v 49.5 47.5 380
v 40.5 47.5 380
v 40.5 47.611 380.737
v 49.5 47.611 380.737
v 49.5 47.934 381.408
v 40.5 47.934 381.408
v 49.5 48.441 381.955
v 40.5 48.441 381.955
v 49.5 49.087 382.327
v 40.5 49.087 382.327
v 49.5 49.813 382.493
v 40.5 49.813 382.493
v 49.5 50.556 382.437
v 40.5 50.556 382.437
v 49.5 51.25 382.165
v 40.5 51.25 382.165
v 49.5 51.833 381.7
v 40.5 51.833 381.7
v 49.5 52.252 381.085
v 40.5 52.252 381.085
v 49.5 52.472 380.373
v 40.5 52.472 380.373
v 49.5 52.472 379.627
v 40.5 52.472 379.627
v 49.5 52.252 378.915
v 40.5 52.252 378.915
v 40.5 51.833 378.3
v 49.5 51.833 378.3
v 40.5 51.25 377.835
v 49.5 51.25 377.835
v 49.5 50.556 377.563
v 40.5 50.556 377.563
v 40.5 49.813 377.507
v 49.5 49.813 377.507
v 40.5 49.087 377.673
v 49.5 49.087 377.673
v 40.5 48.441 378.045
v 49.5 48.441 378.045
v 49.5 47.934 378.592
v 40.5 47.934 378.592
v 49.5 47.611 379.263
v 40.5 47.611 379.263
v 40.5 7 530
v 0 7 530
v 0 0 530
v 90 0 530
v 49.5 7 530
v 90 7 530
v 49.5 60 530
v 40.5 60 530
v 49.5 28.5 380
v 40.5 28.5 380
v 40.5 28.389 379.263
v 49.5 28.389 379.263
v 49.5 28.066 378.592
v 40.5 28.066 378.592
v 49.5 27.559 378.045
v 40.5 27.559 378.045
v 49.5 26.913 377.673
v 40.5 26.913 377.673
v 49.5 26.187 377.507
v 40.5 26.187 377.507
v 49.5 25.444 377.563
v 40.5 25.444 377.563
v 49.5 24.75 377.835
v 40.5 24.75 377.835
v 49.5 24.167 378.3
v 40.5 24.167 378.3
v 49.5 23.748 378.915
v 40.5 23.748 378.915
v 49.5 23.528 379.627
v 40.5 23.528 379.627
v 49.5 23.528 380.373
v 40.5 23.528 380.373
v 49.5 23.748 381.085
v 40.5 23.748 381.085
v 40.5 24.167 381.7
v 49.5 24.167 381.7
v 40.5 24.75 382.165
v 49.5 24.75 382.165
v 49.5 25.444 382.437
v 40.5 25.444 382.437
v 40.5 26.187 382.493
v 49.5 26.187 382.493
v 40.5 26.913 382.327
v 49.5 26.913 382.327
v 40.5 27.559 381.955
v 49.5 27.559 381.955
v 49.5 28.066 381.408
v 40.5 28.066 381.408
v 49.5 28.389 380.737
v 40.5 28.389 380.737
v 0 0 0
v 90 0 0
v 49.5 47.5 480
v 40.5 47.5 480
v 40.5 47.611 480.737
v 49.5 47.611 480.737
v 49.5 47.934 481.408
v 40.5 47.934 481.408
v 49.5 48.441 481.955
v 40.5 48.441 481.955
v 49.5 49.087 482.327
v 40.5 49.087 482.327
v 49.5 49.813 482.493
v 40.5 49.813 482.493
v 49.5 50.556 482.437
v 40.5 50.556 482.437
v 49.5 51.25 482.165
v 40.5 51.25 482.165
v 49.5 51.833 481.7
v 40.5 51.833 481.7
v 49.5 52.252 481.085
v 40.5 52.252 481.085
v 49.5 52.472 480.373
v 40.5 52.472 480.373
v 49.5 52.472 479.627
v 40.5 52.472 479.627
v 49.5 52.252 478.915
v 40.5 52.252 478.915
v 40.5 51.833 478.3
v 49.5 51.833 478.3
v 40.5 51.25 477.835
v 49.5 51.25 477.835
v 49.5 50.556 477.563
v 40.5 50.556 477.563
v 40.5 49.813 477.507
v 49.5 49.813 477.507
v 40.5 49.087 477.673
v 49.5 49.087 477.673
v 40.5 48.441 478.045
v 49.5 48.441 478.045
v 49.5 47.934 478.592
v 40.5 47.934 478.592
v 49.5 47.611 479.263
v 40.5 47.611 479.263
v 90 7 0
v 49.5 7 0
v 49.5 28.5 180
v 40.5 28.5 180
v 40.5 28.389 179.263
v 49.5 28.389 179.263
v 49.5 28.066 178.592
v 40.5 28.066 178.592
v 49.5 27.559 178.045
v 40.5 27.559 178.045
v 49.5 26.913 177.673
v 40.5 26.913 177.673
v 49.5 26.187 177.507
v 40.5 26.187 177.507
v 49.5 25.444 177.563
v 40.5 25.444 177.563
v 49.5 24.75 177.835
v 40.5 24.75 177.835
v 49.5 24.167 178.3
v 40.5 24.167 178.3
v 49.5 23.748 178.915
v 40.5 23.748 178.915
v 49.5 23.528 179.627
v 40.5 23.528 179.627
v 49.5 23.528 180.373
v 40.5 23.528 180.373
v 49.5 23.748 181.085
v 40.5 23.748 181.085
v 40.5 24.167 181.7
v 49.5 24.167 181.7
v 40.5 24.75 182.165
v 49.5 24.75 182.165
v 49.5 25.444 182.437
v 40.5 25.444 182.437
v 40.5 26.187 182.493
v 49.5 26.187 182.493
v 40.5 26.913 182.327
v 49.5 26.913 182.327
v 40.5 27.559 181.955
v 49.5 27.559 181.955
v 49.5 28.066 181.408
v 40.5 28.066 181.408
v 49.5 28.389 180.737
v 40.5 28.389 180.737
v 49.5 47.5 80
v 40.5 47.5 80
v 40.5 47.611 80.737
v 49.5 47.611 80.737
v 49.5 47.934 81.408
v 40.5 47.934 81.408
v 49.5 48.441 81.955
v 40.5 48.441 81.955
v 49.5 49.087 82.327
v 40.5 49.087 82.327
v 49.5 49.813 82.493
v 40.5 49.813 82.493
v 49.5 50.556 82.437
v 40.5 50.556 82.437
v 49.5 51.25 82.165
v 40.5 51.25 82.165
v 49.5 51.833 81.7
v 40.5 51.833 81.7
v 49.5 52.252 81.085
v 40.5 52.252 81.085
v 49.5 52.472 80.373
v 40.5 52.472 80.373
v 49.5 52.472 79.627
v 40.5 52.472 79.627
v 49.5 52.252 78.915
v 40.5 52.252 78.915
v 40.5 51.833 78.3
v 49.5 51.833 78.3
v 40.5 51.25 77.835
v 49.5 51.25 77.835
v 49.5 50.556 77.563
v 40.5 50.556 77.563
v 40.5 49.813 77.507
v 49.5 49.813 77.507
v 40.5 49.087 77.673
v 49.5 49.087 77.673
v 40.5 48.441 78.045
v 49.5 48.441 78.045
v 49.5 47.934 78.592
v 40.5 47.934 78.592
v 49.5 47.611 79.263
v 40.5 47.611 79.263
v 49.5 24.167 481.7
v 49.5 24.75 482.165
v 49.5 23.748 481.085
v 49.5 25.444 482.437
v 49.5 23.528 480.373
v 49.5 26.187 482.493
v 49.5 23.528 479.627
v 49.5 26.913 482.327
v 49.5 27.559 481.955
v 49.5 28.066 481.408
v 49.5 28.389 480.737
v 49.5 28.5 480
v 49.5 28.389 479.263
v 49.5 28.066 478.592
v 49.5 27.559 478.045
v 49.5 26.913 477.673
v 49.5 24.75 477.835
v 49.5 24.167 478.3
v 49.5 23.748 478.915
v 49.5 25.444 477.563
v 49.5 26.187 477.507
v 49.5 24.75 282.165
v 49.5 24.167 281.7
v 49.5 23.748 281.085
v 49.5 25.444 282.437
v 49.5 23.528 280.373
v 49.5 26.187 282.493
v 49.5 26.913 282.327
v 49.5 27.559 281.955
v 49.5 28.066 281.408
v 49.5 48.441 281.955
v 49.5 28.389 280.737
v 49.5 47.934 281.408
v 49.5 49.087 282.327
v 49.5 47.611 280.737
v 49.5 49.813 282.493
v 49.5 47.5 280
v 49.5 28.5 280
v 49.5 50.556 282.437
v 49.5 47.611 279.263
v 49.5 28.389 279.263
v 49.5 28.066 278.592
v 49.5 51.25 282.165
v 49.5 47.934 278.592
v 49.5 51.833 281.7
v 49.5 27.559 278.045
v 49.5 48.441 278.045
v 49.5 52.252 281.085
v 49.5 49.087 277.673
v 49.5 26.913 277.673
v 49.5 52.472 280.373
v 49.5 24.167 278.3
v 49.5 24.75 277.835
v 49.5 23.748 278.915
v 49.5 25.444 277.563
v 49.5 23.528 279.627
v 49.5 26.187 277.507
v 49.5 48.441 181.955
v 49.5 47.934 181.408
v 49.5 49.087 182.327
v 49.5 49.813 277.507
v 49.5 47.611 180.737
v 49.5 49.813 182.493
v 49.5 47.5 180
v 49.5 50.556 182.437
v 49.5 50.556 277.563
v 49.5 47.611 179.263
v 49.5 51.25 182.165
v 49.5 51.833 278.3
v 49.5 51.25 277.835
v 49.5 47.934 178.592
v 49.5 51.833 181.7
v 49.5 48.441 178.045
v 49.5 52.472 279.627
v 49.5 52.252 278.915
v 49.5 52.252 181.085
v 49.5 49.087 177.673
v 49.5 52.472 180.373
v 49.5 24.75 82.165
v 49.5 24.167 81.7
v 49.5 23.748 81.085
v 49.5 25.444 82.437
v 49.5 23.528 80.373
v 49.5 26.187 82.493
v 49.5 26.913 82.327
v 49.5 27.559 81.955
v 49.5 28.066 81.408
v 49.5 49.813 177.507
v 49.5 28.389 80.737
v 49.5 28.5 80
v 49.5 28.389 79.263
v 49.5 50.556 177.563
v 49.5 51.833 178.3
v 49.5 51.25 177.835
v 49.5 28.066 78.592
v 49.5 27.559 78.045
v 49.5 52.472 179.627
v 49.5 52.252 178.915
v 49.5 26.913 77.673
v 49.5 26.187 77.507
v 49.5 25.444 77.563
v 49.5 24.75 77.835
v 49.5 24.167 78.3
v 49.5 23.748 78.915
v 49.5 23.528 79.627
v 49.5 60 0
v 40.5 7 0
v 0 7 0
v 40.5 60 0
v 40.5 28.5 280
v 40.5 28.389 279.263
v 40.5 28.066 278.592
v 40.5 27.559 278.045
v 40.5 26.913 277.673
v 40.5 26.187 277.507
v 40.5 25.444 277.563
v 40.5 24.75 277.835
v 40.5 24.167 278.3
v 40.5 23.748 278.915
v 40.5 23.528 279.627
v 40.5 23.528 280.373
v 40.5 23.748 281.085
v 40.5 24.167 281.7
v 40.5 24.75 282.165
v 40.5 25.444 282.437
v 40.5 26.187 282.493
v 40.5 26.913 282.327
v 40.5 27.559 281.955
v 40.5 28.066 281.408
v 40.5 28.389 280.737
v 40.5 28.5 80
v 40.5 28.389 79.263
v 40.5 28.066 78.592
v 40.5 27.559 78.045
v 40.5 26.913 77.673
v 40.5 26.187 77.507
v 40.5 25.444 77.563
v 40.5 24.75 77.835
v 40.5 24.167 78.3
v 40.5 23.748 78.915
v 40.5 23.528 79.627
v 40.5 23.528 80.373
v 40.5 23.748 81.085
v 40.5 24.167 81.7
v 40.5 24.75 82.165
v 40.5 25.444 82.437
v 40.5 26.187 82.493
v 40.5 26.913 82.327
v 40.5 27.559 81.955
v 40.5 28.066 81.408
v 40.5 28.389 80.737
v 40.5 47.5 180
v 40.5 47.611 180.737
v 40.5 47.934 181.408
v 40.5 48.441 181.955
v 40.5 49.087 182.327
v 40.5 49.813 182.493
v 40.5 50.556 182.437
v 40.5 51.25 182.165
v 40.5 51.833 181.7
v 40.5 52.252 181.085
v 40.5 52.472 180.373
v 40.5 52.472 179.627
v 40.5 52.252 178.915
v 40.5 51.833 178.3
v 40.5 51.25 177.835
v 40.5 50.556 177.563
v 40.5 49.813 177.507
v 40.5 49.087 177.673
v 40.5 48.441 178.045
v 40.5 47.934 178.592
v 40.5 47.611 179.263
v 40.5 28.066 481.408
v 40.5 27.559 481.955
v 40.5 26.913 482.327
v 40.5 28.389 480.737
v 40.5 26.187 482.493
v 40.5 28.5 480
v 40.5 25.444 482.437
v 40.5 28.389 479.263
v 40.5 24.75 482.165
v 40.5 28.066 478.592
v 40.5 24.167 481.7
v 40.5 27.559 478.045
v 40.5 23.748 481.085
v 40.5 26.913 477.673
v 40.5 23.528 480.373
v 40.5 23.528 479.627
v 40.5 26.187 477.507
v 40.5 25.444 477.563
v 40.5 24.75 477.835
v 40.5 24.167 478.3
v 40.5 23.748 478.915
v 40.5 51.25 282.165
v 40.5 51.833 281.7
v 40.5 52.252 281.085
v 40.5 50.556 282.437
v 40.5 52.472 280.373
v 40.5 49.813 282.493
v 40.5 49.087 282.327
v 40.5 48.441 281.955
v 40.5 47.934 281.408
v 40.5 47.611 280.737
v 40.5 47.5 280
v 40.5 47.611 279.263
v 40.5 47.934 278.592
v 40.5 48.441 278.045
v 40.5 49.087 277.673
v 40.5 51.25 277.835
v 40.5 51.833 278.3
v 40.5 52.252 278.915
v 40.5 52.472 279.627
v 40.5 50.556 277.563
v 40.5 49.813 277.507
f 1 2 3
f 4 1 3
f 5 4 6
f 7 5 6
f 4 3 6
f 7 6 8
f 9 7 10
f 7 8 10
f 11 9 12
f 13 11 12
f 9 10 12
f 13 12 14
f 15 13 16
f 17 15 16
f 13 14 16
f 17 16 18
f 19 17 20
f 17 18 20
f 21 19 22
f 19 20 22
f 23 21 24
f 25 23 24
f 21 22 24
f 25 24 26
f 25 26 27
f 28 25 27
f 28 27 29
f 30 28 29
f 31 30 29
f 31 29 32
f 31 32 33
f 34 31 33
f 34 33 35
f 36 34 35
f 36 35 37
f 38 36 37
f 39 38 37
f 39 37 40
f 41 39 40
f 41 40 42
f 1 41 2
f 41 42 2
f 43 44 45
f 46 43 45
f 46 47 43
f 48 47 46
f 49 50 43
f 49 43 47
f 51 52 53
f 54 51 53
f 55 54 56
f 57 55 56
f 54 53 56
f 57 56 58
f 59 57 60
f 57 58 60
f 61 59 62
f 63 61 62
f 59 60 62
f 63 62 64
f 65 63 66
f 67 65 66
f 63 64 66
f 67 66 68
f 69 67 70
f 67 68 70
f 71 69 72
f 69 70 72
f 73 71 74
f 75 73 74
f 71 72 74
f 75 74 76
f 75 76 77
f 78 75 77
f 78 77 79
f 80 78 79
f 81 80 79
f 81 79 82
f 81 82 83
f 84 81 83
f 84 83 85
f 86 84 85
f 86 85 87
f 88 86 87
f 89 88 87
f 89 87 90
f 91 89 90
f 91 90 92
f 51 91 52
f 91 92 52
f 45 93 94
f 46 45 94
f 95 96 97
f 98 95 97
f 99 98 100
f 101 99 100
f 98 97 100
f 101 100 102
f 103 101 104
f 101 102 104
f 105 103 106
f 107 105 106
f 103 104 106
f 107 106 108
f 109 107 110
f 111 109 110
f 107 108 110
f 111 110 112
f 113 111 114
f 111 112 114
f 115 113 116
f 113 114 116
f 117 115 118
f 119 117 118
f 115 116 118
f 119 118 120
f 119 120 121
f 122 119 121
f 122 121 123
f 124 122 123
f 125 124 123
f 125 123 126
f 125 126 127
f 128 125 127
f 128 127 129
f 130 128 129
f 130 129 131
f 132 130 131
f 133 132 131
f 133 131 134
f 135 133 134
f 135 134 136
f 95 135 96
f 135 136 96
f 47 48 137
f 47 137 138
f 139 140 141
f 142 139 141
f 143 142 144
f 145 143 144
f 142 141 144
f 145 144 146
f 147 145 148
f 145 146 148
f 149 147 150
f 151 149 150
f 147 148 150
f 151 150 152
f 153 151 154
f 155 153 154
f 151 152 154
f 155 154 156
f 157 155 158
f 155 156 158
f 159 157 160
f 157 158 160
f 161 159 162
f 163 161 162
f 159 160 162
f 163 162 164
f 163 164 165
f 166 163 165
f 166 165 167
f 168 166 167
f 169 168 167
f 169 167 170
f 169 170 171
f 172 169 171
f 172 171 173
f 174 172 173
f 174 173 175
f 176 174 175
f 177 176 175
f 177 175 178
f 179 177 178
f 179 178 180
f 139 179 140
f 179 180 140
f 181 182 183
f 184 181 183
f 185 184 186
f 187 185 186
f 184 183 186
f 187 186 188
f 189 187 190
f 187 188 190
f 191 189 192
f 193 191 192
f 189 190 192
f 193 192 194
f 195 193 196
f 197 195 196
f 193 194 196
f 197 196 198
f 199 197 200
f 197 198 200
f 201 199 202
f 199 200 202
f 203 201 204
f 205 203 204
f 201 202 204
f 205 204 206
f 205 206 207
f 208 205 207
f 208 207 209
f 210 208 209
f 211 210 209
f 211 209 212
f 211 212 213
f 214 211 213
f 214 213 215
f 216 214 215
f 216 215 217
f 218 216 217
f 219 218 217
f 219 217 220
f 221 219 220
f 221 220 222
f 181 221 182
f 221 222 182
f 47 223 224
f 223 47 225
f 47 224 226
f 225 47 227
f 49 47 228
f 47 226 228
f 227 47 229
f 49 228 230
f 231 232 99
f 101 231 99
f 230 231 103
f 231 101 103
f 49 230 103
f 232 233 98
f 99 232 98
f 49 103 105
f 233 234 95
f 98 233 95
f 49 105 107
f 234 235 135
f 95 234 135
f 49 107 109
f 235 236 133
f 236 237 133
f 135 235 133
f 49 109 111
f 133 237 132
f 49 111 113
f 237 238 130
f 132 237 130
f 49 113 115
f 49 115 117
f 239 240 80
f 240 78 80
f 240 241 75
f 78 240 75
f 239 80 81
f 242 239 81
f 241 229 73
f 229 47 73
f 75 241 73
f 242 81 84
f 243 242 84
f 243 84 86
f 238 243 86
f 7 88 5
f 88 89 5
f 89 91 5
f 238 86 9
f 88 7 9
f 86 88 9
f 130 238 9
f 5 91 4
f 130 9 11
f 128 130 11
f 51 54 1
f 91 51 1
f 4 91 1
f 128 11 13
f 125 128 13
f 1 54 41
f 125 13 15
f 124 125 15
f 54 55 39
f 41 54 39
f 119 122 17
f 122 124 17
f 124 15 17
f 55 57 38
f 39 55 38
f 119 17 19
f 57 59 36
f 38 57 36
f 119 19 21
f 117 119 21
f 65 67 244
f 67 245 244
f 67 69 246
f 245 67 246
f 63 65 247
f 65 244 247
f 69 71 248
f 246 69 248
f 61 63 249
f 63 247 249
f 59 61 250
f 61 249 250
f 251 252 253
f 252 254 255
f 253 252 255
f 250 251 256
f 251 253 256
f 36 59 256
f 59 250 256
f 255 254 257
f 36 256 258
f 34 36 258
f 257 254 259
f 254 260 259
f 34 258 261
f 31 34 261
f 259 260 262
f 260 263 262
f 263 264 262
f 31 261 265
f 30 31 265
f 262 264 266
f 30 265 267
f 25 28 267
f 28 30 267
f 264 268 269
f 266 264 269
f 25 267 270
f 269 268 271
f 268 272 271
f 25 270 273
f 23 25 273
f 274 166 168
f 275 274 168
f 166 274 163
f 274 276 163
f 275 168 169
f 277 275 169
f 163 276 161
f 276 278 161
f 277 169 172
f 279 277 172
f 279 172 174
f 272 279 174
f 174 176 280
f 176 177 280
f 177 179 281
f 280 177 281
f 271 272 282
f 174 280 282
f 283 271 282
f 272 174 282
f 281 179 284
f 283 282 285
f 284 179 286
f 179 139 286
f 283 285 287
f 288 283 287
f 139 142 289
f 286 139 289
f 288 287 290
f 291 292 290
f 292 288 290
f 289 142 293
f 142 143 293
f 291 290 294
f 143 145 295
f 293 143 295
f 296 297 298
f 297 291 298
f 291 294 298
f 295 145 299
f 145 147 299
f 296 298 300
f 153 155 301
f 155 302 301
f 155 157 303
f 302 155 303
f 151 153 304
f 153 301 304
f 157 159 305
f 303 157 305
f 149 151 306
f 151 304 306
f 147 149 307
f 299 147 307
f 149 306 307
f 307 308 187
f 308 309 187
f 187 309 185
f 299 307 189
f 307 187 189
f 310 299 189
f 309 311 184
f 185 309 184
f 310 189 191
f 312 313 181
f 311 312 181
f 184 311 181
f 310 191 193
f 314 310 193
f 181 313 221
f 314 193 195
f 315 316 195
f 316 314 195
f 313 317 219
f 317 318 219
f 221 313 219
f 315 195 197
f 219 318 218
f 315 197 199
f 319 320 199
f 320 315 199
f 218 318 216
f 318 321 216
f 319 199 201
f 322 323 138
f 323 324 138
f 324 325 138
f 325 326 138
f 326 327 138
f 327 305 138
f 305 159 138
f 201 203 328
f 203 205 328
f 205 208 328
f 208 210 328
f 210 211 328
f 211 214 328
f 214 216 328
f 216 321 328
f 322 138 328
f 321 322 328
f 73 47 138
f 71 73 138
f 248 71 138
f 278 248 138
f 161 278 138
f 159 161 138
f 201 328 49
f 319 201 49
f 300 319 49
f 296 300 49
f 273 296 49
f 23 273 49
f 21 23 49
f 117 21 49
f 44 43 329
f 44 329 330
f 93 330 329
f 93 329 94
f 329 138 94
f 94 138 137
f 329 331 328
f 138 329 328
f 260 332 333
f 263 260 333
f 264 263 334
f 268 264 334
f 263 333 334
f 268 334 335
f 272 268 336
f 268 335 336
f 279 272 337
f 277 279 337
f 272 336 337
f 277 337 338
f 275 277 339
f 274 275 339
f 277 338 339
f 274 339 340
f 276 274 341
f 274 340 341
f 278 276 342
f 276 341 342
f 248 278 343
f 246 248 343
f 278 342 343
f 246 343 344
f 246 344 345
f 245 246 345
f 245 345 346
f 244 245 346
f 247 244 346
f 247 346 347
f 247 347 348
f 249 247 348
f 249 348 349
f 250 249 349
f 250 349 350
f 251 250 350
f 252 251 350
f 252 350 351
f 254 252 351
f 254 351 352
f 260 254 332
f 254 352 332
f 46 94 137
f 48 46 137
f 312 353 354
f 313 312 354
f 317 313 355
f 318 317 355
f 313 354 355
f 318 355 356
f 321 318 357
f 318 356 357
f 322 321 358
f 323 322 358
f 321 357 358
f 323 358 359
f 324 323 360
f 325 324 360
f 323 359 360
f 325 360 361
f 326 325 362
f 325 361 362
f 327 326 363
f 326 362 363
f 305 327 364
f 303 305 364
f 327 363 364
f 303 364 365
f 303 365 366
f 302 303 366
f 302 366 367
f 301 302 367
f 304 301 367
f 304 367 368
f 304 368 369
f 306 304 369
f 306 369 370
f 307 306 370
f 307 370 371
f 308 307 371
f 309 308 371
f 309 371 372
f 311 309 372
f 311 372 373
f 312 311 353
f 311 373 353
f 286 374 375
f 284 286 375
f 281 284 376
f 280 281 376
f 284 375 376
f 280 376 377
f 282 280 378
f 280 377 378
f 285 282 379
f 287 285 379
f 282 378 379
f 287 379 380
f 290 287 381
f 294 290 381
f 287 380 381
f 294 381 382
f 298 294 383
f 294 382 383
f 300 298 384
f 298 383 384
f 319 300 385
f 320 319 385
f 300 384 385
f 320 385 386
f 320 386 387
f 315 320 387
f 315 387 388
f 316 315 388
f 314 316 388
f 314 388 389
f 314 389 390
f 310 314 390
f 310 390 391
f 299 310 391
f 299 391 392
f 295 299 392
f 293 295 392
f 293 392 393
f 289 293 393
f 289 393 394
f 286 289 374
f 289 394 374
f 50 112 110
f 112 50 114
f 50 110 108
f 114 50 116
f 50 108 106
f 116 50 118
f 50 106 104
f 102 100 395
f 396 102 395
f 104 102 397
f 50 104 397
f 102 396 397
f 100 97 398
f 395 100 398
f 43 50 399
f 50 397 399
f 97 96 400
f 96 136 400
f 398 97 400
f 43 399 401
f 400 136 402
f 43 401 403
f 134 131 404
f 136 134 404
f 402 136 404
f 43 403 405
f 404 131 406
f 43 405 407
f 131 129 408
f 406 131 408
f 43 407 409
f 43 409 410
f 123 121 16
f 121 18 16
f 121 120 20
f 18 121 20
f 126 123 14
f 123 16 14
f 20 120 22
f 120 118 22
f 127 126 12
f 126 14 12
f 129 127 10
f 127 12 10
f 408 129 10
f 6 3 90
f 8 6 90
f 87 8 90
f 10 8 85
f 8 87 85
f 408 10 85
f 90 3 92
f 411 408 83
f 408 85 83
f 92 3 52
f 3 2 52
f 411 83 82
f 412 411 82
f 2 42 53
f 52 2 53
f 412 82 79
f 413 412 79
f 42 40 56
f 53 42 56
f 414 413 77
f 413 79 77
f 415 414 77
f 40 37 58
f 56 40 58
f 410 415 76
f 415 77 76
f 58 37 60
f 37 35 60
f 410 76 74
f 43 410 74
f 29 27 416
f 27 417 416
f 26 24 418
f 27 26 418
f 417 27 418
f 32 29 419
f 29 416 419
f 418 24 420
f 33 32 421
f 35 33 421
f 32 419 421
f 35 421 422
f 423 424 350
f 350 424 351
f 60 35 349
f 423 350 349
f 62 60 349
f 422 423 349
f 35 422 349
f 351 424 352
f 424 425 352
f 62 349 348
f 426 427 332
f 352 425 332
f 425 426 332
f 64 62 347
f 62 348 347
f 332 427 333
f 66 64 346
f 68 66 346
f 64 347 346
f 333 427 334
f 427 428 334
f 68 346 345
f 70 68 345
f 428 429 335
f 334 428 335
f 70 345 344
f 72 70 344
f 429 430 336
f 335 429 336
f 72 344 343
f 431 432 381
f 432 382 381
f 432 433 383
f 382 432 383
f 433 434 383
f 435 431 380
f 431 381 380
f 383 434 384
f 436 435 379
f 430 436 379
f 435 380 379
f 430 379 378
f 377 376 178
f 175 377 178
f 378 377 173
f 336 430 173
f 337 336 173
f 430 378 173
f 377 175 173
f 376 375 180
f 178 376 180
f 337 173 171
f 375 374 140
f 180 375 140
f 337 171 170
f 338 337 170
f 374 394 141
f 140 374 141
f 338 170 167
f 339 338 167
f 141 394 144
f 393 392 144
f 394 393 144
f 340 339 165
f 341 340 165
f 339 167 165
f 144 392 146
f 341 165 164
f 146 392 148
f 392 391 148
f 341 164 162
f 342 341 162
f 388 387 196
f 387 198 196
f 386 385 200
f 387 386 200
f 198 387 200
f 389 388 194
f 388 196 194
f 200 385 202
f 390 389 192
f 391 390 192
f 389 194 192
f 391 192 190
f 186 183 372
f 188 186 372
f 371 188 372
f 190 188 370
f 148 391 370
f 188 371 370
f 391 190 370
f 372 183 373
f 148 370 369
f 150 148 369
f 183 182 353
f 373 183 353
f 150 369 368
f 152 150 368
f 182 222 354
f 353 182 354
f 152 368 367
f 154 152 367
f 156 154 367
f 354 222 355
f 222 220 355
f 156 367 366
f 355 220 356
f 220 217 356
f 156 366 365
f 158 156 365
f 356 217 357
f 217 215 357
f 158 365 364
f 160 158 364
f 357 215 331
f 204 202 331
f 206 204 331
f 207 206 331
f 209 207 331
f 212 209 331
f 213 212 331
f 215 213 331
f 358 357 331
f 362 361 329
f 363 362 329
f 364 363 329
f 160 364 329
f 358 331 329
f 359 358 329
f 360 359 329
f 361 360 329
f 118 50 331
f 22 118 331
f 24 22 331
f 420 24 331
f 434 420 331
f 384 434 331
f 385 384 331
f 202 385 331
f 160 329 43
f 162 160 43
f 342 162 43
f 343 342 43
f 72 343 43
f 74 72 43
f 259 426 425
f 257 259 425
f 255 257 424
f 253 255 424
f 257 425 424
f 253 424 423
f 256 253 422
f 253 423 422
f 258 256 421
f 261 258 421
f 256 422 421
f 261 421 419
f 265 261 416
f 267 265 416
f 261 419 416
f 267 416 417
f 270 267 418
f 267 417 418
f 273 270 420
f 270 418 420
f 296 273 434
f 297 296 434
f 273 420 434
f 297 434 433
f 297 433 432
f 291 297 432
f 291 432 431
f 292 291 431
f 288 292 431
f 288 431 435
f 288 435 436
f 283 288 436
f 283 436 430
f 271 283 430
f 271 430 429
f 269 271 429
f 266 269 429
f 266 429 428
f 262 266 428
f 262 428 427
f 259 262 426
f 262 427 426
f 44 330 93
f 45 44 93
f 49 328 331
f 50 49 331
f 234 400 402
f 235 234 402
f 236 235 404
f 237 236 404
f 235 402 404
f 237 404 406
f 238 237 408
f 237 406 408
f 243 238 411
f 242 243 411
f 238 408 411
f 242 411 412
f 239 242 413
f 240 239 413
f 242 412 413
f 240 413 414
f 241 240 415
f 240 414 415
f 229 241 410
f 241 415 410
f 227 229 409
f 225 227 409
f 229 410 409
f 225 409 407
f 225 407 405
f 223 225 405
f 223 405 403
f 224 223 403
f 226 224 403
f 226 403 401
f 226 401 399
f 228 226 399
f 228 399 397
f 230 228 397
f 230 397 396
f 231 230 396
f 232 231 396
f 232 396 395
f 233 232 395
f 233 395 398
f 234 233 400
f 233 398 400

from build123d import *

# Parameters (mm, degrees)
BOSS_EXTRU_1_DEPTH      = 530
ESQUISSE2_R             = 2.5
ENL_V_MAT_EXTRU_1_DEPTH = 9


with BuildPart() as part:
    # Esquisse1 → Boss.-Extru.1 (new body)
    with BuildSketch(Plane.XY):
        Polygon((0, 0), (90, 0), (90, 7), (49.5, 7), (49.5, 60), (40.5, 60), (40.5, 7), (0, 7), align=None)
    extrude(amount=BOSS_EXTRU_1_DEPTH)

    # Esquisse2 → Enlèv. mat.-Extru.1 (cut)
    with BuildSketch(Plane.ZY.offset(-40.5)):
        with Locations(Location((80, 50, 0), (0, 0, 270))):
            Circle(ESQUISSE2_R)
        with Locations(Location((80, 26, 0), (0, 0, 90))):
            Circle(ESQUISSE2_R)
        with Locations(Location((180, 50, 0), (0, 0, 270))):
            Circle(ESQUISSE2_R)
        with Locations(Location((180, 26, 0), (0, 0, 90))):
            Circle(ESQUISSE2_R)
        with Locations(Location((280, 50, 0), (0, 0, 270))):
            Circle(ESQUISSE2_R)
        with Locations(Location((280, 26, 0), (0, 0, 90))):
            Circle(ESQUISSE2_R)
        with Locations(Location((380, 50, 0), (0, 0, 270))):
            Circle(ESQUISSE2_R)
        with Locations(Location((380, 26, 0), (0, 0, 90))):
            Circle(ESQUISSE2_R)
        with Locations(Location((480, 50, 0), (0, 0, 270))):
            Circle(ESQUISSE2_R)
        with Locations(Location((480, 26, 0), (0, 0, 90))):
            Circle(ESQUISSE2_R)
    extrude(amount=-ENL_V_MAT_EXTRU_1_DEPTH, mode=Mode.SUBTRACT)


solid = part.part
